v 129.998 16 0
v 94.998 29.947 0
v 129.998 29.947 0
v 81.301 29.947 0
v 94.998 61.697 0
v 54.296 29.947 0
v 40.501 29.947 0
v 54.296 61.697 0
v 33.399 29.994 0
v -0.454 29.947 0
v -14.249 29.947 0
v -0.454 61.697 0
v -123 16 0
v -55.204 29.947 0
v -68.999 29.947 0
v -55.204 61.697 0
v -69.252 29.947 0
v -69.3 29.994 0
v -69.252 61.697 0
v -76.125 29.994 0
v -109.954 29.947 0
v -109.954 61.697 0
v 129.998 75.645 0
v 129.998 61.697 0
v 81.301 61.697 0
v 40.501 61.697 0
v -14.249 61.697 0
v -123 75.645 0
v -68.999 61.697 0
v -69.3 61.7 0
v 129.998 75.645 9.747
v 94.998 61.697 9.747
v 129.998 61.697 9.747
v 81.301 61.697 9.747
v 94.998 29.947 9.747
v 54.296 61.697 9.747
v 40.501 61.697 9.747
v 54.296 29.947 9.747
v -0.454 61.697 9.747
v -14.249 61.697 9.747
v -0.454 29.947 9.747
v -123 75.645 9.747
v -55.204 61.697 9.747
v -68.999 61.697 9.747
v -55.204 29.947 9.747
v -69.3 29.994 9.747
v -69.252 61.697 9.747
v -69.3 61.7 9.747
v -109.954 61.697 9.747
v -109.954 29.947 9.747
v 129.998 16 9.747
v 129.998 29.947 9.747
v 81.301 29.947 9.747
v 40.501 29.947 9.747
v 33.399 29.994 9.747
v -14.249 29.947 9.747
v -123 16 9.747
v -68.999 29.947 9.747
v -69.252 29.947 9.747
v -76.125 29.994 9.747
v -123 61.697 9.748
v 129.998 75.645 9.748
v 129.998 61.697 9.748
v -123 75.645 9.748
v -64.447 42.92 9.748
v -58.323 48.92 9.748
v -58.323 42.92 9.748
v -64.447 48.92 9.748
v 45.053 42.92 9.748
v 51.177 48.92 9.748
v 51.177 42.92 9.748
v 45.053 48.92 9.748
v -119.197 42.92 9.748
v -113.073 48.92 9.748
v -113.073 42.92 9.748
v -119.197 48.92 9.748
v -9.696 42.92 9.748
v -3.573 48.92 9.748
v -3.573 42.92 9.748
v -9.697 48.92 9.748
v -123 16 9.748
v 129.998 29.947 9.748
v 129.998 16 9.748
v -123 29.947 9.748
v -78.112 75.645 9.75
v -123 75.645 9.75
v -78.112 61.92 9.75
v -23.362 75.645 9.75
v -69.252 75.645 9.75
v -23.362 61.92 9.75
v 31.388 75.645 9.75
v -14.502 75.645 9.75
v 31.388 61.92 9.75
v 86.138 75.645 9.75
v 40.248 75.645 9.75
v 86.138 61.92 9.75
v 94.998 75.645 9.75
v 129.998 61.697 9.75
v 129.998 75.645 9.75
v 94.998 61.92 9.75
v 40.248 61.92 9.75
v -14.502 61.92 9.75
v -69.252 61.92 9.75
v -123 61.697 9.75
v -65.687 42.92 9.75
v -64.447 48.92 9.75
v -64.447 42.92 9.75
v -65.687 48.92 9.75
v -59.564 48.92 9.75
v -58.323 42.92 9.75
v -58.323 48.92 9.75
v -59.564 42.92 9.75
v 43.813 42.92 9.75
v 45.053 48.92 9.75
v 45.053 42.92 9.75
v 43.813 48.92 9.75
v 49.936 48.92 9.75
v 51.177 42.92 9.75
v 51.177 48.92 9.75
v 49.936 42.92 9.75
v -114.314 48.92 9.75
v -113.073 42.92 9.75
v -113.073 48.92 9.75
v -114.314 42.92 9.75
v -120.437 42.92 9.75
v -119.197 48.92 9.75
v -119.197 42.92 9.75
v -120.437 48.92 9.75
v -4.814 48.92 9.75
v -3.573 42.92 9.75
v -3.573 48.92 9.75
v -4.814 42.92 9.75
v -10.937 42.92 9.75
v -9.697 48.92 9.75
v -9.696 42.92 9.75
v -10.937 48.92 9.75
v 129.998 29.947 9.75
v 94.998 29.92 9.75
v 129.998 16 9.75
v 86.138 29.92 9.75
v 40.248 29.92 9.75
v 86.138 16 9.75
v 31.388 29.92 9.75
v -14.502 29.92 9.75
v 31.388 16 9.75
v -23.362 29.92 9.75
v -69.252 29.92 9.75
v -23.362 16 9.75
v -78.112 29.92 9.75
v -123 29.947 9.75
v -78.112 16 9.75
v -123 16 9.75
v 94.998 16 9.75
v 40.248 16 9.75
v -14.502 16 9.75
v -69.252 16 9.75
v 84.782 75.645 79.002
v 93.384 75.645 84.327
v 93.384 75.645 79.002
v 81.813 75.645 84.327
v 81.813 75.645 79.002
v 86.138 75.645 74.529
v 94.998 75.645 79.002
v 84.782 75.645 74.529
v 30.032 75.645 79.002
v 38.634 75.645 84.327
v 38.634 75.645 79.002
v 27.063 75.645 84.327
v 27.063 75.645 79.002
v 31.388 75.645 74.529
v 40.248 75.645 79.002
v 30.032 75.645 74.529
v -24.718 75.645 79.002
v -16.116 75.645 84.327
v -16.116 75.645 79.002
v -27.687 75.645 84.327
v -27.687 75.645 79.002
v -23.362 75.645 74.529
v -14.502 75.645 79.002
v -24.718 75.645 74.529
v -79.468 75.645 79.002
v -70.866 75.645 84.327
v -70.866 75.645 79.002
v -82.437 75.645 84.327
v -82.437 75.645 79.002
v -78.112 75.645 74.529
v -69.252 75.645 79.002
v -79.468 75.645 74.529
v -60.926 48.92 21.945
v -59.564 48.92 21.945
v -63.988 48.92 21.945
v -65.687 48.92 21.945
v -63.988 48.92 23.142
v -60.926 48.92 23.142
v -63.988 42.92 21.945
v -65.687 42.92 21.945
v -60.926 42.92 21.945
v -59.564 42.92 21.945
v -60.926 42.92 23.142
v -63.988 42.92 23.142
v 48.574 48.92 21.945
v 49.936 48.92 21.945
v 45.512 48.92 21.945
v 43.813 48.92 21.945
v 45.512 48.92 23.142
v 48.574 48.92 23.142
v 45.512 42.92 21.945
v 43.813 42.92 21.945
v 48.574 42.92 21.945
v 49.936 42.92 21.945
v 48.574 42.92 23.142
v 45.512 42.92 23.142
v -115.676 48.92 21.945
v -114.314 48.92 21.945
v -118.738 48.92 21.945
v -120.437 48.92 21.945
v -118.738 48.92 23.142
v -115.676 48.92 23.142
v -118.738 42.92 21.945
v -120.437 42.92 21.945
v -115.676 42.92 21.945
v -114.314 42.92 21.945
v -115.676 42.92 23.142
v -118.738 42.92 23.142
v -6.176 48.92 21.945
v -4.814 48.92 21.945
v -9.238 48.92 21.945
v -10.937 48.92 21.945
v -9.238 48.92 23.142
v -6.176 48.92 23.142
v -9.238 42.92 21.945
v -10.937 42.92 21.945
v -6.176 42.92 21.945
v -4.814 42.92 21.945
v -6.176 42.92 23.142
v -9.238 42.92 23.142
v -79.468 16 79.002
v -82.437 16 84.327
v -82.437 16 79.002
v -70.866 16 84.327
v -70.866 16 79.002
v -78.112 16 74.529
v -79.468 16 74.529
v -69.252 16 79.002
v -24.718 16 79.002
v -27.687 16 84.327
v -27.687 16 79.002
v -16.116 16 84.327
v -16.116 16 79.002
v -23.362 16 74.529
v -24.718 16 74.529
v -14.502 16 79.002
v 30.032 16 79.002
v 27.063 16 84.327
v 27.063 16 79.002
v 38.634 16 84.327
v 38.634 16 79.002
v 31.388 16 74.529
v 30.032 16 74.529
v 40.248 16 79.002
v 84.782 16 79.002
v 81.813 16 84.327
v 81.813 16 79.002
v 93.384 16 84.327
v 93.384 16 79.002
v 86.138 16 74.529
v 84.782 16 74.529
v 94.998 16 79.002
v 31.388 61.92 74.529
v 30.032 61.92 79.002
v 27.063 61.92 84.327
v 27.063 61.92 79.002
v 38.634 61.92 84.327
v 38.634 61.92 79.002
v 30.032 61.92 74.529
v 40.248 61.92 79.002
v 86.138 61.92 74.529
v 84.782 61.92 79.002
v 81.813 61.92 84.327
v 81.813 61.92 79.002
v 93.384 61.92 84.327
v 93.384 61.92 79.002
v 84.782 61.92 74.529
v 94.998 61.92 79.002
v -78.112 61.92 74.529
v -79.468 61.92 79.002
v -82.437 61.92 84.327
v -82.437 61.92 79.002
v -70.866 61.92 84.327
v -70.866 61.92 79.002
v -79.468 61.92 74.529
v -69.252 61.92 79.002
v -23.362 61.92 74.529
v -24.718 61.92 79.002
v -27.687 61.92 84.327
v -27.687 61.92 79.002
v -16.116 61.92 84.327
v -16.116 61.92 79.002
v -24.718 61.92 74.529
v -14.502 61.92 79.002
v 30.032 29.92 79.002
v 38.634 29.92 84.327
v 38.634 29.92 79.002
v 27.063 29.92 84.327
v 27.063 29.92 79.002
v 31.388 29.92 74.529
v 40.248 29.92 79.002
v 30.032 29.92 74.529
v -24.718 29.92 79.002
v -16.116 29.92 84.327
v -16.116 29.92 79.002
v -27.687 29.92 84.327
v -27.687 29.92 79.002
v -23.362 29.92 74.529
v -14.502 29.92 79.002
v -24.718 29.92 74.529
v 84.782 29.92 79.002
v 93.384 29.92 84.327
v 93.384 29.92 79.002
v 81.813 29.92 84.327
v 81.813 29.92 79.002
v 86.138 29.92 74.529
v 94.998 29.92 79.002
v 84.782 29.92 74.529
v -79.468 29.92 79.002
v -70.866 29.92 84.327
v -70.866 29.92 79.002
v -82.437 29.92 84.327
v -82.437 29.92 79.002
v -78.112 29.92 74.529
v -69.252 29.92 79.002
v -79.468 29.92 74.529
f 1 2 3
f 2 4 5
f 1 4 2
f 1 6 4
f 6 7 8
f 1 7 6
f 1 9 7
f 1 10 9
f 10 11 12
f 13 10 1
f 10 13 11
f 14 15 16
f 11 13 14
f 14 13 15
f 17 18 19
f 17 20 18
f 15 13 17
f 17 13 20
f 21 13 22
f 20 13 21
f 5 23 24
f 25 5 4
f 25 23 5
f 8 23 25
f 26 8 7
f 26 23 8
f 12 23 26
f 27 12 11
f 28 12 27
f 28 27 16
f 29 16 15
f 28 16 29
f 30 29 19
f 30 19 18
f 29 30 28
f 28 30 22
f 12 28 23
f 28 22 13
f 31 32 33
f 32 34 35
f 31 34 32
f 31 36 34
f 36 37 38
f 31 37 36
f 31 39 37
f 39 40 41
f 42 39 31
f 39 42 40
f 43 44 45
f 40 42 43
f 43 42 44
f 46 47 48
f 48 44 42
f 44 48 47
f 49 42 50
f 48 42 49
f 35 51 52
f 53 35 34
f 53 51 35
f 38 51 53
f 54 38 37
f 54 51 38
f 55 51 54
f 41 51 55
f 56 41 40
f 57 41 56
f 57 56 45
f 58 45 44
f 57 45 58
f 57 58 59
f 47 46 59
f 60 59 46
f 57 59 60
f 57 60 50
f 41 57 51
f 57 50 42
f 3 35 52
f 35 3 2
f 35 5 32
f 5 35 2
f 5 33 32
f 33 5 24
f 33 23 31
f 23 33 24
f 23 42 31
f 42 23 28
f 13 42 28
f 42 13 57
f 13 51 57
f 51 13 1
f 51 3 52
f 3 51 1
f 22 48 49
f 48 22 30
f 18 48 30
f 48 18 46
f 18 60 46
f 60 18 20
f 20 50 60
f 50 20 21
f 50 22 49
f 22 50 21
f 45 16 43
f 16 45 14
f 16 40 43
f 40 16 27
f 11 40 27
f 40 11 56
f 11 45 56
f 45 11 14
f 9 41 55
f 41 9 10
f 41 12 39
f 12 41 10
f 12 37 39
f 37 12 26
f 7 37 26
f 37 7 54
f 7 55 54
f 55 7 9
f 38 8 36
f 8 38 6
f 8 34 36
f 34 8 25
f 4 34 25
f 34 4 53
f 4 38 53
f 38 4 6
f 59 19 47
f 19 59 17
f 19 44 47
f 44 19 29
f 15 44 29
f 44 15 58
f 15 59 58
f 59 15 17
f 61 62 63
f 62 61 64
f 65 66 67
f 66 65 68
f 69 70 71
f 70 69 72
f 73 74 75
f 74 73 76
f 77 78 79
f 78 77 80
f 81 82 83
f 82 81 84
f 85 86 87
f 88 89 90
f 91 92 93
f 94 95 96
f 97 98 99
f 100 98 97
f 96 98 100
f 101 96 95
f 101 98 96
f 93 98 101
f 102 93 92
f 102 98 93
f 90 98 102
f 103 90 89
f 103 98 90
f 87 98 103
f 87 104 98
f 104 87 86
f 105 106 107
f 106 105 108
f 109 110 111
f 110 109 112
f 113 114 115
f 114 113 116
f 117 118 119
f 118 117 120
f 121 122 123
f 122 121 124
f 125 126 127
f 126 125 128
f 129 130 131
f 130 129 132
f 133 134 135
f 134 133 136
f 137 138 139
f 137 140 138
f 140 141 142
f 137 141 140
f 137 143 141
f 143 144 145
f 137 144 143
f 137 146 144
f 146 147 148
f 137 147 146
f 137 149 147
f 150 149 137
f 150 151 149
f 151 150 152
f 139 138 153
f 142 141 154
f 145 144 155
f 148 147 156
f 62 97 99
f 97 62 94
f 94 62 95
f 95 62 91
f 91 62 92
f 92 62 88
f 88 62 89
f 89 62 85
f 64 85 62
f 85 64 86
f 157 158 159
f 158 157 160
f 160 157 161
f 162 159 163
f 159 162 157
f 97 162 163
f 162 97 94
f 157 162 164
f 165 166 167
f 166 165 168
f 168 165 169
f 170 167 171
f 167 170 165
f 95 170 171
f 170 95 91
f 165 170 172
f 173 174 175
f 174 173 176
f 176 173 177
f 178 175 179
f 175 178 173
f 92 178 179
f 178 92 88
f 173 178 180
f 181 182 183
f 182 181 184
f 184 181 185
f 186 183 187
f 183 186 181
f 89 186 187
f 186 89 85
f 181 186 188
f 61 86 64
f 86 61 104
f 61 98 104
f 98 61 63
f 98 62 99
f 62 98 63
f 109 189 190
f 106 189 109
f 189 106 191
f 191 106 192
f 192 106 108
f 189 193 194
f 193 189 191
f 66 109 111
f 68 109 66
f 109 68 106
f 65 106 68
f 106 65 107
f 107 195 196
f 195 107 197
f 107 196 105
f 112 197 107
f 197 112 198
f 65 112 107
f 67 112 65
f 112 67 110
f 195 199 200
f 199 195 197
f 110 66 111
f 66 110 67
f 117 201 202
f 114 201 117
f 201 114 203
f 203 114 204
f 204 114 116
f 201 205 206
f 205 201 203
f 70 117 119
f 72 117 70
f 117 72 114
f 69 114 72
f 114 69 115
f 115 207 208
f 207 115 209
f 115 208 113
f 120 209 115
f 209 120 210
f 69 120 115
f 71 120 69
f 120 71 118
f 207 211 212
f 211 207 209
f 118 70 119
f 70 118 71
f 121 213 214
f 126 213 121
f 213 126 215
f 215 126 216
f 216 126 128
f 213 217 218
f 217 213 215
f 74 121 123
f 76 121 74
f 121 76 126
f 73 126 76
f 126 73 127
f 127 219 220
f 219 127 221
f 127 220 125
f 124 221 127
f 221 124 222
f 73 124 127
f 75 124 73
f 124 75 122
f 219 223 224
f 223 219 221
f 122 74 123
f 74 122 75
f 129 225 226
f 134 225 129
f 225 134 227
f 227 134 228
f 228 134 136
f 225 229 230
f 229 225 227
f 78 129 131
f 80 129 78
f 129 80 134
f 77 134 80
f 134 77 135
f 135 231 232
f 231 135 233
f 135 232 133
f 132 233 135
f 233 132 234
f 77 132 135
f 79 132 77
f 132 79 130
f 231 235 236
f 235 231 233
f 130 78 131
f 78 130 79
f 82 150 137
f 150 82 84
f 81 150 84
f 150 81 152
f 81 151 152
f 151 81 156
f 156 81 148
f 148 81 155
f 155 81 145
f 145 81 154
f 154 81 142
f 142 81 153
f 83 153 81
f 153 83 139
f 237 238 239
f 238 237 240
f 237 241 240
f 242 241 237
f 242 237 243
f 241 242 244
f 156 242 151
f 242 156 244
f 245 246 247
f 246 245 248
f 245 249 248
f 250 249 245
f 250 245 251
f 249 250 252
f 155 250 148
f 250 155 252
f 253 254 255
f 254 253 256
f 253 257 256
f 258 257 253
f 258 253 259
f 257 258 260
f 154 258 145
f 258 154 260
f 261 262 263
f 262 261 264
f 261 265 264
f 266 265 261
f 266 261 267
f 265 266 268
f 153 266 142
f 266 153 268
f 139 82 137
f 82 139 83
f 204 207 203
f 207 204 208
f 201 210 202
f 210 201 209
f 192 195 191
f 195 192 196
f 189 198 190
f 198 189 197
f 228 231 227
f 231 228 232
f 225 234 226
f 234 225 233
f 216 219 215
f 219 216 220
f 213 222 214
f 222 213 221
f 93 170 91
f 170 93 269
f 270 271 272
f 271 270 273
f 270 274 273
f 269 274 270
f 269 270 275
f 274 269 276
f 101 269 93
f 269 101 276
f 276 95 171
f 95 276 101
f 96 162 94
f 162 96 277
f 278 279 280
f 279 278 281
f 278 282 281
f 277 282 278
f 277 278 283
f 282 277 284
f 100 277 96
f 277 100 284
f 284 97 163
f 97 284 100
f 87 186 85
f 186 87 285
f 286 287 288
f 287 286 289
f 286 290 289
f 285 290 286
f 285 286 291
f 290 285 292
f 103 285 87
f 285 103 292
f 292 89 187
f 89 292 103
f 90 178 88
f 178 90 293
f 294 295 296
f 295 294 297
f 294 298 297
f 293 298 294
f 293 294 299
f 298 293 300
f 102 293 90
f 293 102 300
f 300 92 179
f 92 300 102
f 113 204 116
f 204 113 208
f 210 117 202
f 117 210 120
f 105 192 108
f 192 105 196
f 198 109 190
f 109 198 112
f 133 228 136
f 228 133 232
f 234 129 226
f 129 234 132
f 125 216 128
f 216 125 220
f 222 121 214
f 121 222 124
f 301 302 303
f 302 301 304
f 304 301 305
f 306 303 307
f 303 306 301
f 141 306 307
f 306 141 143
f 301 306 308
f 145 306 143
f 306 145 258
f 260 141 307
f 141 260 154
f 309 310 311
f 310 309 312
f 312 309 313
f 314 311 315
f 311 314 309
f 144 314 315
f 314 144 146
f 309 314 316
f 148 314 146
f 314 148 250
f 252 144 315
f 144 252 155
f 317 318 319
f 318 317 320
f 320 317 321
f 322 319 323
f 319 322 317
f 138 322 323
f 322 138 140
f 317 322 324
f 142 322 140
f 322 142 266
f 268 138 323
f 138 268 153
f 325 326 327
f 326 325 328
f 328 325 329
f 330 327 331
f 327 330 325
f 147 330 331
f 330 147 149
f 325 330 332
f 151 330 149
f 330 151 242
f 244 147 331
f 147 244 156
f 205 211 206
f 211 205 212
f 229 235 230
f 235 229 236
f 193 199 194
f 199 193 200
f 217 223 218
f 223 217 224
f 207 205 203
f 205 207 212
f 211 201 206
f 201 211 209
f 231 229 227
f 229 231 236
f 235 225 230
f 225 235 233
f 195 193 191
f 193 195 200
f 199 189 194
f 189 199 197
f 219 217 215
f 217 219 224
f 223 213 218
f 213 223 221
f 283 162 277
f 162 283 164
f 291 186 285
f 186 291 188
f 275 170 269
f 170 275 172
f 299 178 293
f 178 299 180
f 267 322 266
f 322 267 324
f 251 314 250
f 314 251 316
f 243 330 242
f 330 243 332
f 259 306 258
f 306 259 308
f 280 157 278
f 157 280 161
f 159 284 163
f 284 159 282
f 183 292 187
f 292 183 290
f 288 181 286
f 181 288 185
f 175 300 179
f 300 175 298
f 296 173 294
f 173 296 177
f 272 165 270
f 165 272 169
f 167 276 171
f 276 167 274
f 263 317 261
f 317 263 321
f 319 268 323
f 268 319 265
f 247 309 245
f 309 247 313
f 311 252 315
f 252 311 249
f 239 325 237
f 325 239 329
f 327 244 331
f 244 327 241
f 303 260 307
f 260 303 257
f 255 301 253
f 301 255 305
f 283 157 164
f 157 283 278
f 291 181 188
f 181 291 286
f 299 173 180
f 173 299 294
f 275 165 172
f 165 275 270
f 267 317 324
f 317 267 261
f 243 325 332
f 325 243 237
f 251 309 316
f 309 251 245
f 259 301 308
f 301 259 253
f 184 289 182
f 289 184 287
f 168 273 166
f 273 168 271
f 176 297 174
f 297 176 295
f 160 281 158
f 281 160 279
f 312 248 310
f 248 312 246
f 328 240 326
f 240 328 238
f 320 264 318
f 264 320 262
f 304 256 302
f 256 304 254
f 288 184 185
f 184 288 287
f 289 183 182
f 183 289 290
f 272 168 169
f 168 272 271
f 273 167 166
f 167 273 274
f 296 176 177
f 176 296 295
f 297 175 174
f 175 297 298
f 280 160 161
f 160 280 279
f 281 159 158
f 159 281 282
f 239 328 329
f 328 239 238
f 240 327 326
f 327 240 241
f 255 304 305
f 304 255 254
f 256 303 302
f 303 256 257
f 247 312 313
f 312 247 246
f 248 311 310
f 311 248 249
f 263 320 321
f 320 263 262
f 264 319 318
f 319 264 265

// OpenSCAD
// Auto reverse-engineered from STL into layered parametric OpenSCAD
// This rebuild uses cross-section polygons between Z levels and extrudes each slab.

z_levels = [-0.000000, 0.001000, 9.748000, 9.750000, 21.945000, 23.142000, 74.529000, 79.001600, 84.327000, 87.549000];

module top_parametric(z=z_levels) {
  union() {
    
    // slab 1: z=0.001000..9.748000
    translate([0,0,0.000000]) linear_extrude(height=9.747000) union() {
      // slab 1 poly 0
      polygon(points=[
          [-123.000008, 68.670280],
          [-123.000008, 15.999999],
          [129.997986, 15.999999],
          [129.997986, 29.946999],
          [94.997986, 29.946999],
          [94.997986, 61.696999],
          [129.997986, 61.696999],
          [129.997986, 75.644997],
          [-123.000008, 75.644997],
          [-34.505024, 61.696999],
          [-55.204014, 61.696999],
          [-55.204014, 29.946999],
          [-14.249004, 29.946999],
          [-14.249004, 61.696999],
          [33.399488, 29.993999],
          [40.500984, 29.946999],
          [40.500984, 61.696999],
          [-0.454014, 61.696999],
          [-0.454014, 29.946999],
          [-76.124513, 29.993999],
          [-69.300011, 29.993999],
          [-69.300011, 61.699997],
          [-109.954018, 61.696999],
          [-109.954018, 29.946999],
          [63.978926, 61.696999],
          [54.295986, 61.696999],
          [54.295986, 29.946999],
          [81.300987, 29.946999],
          [81.300987, 61.696999],
          [-68.999001, 61.696999],
          [-69.252014, 61.696999],
          [-69.252014, 29.946999],
          [-68.999001, 29.946999]
      ], paths=[
          [0, 1, 2, 3, 4, 5, 6, 7, 8],
          [9, 10, 11, 12, 13],
          [14, 15, 16, 17, 18],
          [19, 20, 21, 22, 23],
          [24, 25, 26, 27, 28],
          [29, 30, 31, 32]
      ]);
    }
    // slab 2: z=9.748000..9.750000
    translate([0,0,9.748000]) linear_extrude(height=0.002000) union() {
      // slab 2 poly 0
      polygon(points=[
          [-34.505024, 61.696999],
          [129.997986, 61.696999],
          [129.997986, 75.644997],
          [-123.000008, 75.644997],
          [-123.000008, 61.696999]
      ], paths=[
          [0, 1, 2, 3, 4]
      ]);
      // slab 2 poly 1
      polygon(points=[
          [-63.651517, 29.946999],
          [-123.000008, 29.946999],
          [-123.000008, 15.999999],
          [129.997986, 15.999999],
          [129.997986, 29.946999]
      ], paths=[
          [0, 1, 2, 3, 4]
      ]);
      // slab 2 poly 2
      polygon(points=[
          [-64.446630, 42.919998],
          [-58.323427, 42.919998],
          [-58.323427, 48.919998],
          [-64.446630, 48.919998]
      ], paths=[
          [0, 1, 2, 3]
      ]);
      // slab 2 poly 3
      polygon(points=[
          [45.053381, 42.919998],
          [51.176573, 42.919998],
          [51.176573, 48.919998],
          [45.053381, 48.919998]
      ], paths=[
          [0, 1, 2, 3]
      ]);
      // slab 2 poly 4
      polygon(points=[
          [-113.073431, 42.919998],
          [-113.073431, 48.919998],
          [-119.196615, 48.919998],
          [-119.196615, 42.919998]
      ], paths=[
          [0, 1, 2, 3]
      ]);
      // slab 2 poly 5
      polygon(points=[
          [-9.696170, 42.919998],
          [-3.573428, 42.919998],
          [-3.573428, 48.919998],
          [-9.696628, 48.919998]
      ], paths=[
          [0, 1, 2, 3]
      ]);
    }
    // slab 3: z=9.750000..21.945000
    translate([0,0,9.750000]) linear_extrude(height=12.195000) union() {
      // slab 3 poly 0
      polygon(points=[
          [39.414014, 29.919998],
          [31.387985, 29.919998],
          [31.387985, 15.999999],
          [40.247986, 15.999999],
          [40.247986, 29.919998]
      ], paths=[
          [0, 1, 2, 3, 4]
      ]);
      // slab 3 poly 1
      polygon(points=[
          [-15.335986, 29.919998],
          [-23.362015, 29.919998],
          [-23.362015, 15.999999],
          [-14.502014, 15.999999],
          [-14.502014, 29.919998]
      ], paths=[
          [0, 1, 2, 3, 4]
      ]);
      // slab 3 poly 2
      polygon(points=[
          [94.997986, 29.919998],
          [86.137985, 29.919998],
          [86.137985, 15.999999],
          [94.997986, 15.999999]
      ], paths=[
          [0, 1, 2, 3]
      ]);
      // slab 3 poly 3
      polygon(points=[
          [-78.112015, 29.919998],
          [-78.112015, 15.999999],
          [-69.252014, 15.999999],
          [-69.252014, 29.919998]
      ], paths=[
          [0, 1, 2, 3]
      ]);
      // slab 3 poly 4
      polygon(points=[
          [39.414014, 61.919998],
          [40.247986, 61.919998],
          [40.247986, 75.644997],
          [31.387985, 75.644997],
          [31.387985, 61.919998]
      ], paths=[
          [0, 1, 2, 3, 4]
      ]);
      // slab 3 poly 5
      polygon(points=[
          [94.997986, 61.919998],
          [94.997986, 75.644997],
          [86.137985, 75.644997],
          [86.137985, 61.919998]
      ], paths=[
          [0, 1, 2, 3]
      ]);
      // slab 3 poly 6
      polygon(points=[
          [-78.112015, 74.353093],
          [-78.112015, 61.919998],
          [-69.252014, 61.919998],
          [-69.252014, 75.644997],
          [-78.112015, 75.644997]
      ], paths=[
          [0, 1, 2, 3, 4]
      ]);
      // slab 3 poly 7
      polygon(points=[
          [-15.335986, 61.919998],
          [-14.502014, 61.919998],
          [-14.502014, 75.644997],
          [-23.362015, 75.644997],
          [-23.362015, 61.919998]
      ], paths=[
          [0, 1, 2, 3, 4]
      ]);
      // slab 3 poly 8
      polygon(points=[
          [49.935932, 45.652342],
          [49.935932, 48.919998],
          [43.812582, 48.919998],
          [43.812582, 42.919998],
          [49.935932, 42.919998]
      ], paths=[
          [0, 1, 2, 3, 4]
      ]);
      // slab 3 poly 9
      polygon(points=[
          [-62.898826, 42.919998],
          [-59.564071, 42.919998],
          [-59.564071, 48.919998],
          [-65.687418, 48.919998],
          [-65.687418, 42.919998]
      ], paths=[
          [0, 1, 2, 3, 4]
      ]);
      // slab 3 poly 10
      polygon(points=[
          [-10.937418, 42.919998],
          [-4.814072, 42.919998],
          [-4.814072, 48.919998],
          [-10.937418, 48.919998]
      ], paths=[
          [0, 1, 2, 3]
      ]);
      // slab 3 poly 11
      polygon(points=[
          [-117.648819, 42.919998],
          [-114.314075, 42.919998],
          [-114.314075, 48.919998],
          [-120.437410, 48.919998],
          [-120.437410, 42.919998]
      ], paths=[
          [0, 1, 2, 3, 4]
      ]);
    }
    // slab 4: z=21.945000..23.142000
    translate([0,0,21.945000]) linear_extrude(height=1.197000) union() {
      // slab 4 poly 0
      polygon(points=[
          [-16.251816, 29.919998],
          [-23.362015, 29.919998],
          [-23.362015, 15.999999],
          [-14.502014, 15.999999],
          [-14.502014, 29.919998]
      ], paths=[
          [0, 1, 2, 3, 4]
      ]);
      // slab 4 poly 1
      polygon(points=[
          [38.498184, 29.919998],
          [31.387985, 29.919998],
          [31.387985, 15.999999],
          [40.247986, 15.999999],
          [40.247986, 29.919998]
      ], paths=[
          [0, 1, 2, 3, 4]
      ]);
      // slab 4 poly 2
      polygon(points=[
          [94.997986, 29.919998],
          [86.137985, 29.919998],
          [86.137985, 15.999999],
          [94.997986, 15.999999]
      ], paths=[
          [0, 1, 2, 3]
      ]);
      // slab 4 poly 3
      polygon(points=[
          [-78.112015, 29.919998],
          [-78.112015, 15.999999],
          [-69.252014, 15.999999],
          [-69.252014, 29.919998]
      ], paths=[
          [0, 1, 2, 3]
      ]);
      // slab 4 poly 4
      polygon(points=[
          [38.498184, 61.919998],
          [40.247986, 61.919998],
          [40.247986, 75.644997],
          [31.387985, 75.644997],
          [31.387985, 61.919998]
      ], paths=[
          [0, 1, 2, 3, 4]
      ]);
      // slab 4 poly 5
      polygon(points=[
          [94.997986, 64.455545],
          [94.997986, 75.644997],
          [86.137985, 75.644997],
          [86.137985, 61.919998],
          [94.997986, 61.919998]
      ], paths=[
          [0, 1, 2, 3, 4]
      ]);
      // slab 4 poly 6
      polygon(points=[
          [-78.112015, 61.919998],
          [-69.252014, 61.919998],
          [-69.252014, 75.644997],
          [-78.112015, 75.644997]
      ], paths=[
          [0, 1, 2, 3]
      ]);
      // slab 4 poly 7
      polygon(points=[
          [-16.251816, 61.919998],
          [-14.502014, 61.919998],
          [-14.502014, 75.644997],
          [-23.362015, 75.644997],
          [-23.362015, 61.919998]
      ], paths=[
          [0, 1, 2, 3, 4]
      ]);
      // slab 4 poly 8
      polygon(points=[
          [45.511995, 45.920008],
          [45.511995, 42.919998],
          [48.573739, 42.919998],
          [48.573739, 48.919998],
          [45.511995, 48.919998]
      ], paths=[
          [0, 1, 2, 3, 4]
      ]);
      // slab 4 poly 9
      polygon(points=[
          [-6.449878, 42.919998],
          [-6.176269, 42.919998],
          [-6.176269, 48.919998],
          [-9.238005, 48.919998],
          [-9.238005, 42.919998]
      ], paths=[
          [0, 1, 2, 3, 4]
      ]);
      // slab 4 poly 10
      polygon(points=[
          [-63.988003, 45.920008],
          [-63.988003, 42.919998],
          [-60.926268, 42.919998],
          [-60.926268, 48.919998],
          [-63.988003, 48.919998]
      ], paths=[
          [0, 1, 2, 3, 4]
      ]);
      // slab 4 poly 11
      polygon(points=[
          [-115.676272, 48.651894],
          [-115.676272, 48.919998],
          [-118.738005, 48.919998],
          [-118.738005, 42.919998],
          [-115.676272, 42.919998]
      ], paths=[
          [0, 1, 2, 3, 4]
      ]);
    }
    // slab 5: z=23.142000..74.529000
    translate([0,0,23.142000]) linear_extrude(height=51.387000) union() {
      // slab 5 poly 0
      polygon(points=[
          [89.652155, 29.919998],
          [86.137985, 29.919998],
          [86.137985, 15.999999],
          [94.997986, 15.999999],
          [94.997986, 29.919998]
      ], paths=[
          [0, 1, 2, 3, 4]
      ]);
      // slab 5 poly 1
      polygon(points=[
          [-78.112015, 21.521132],
          [-78.112015, 15.999999],
          [-69.252014, 15.999999],
          [-69.252014, 29.919998],
          [-78.112015, 29.919998]
      ], paths=[
          [0, 1, 2, 3, 4]
      ]);
      // slab 5 poly 2
      polygon(points=[
          [34.902155, 29.919998],
          [31.387985, 29.919998],
          [31.387985, 15.999999],
          [40.247986, 15.999999],
          [40.247986, 29.919998]
      ], paths=[
          [0, 1, 2, 3, 4]
      ]);
      // slab 5 poly 3
      polygon(points=[
          [-19.847845, 29.919998],
          [-23.362015, 29.919998],
          [-23.362015, 15.999999],
          [-14.502014, 15.999999],
          [-14.502014, 29.919998]
      ], paths=[
          [0, 1, 2, 3, 4]
      ]);
      // slab 5 poly 4
      polygon(points=[
          [89.652155, 61.919998],
          [94.997986, 61.919998],
          [94.997986, 75.644997],
          [86.137985, 75.644997],
          [86.137985, 61.919998]
      ], paths=[
          [0, 1, 2, 3, 4]
      ]);
      // slab 5 poly 5
      polygon(points=[
          [-78.112015, 61.919998],
          [-69.252014, 61.919998],
          [-69.252014, 75.644997],
          [-78.112015, 75.644997]
      ], paths=[
          [0, 1, 2, 3]
      ]);
      // slab 5 poly 6
      polygon(points=[
          [34.902155, 61.919998],
          [40.247986, 61.919998],
          [40.247986, 75.644997],
          [31.387985, 75.644997],
          [31.387985, 61.919998]
      ], paths=[
          [0, 1, 2, 3, 4]
      ]);
      // slab 5 poly 7
      polygon(points=[
          [-19.847845, 61.919998],
          [-14.502014, 61.919998],
          [-14.502014, 75.644997],
          [-23.362015, 75.644997],
          [-23.362015, 61.919998]
      ], paths=[
          [0, 1, 2, 3, 4]
      ]);
    }
    // slab 6: z=74.529000..79.001600
    translate([0,0,74.529000]) linear_extrude(height=4.472600) union() {
      // slab 6 poly 0
      polygon(points=[
          [90.567939, 29.919998],
          [84.782464, 29.919998],
          [84.782464, 15.999999],
          [94.997986, 15.999999],
          [94.997986, 29.919998]
      ], paths=[
          [0, 1, 2, 3, 4]
      ]);
      // slab 6 poly 1
      polygon(points=[
          [-79.467536, 29.919998],
          [-79.467536, 15.999999],
          [-69.252014, 15.999999],
          [-69.252014, 29.919998]
      ], paths=[
          [0, 1, 2, 3]
      ]);
      // slab 6 poly 2
      polygon(points=[
          [-18.932061, 29.919998],
          [-24.717536, 29.919998],
          [-24.717536, 15.999999],
          [-14.502014, 15.999999],
          [-14.502014, 29.919998]
      ], paths=[
          [0, 1, 2, 3, 4]
      ]);
      // slab 6 poly 3
      polygon(points=[
          [35.817939, 29.919998],
          [30.032464, 29.919998],
          [30.032464, 15.999999],
          [40.247986, 15.999999],
          [40.247986, 29.919998]
      ], paths=[
          [0, 1, 2, 3, 4]
      ]);
      // slab 6 poly 4
      polygon(points=[
          [90.567939, 61.919998],
          [94.997986, 61.919998],
          [94.997986, 75.644997],
          [84.782464, 75.644997],
          [84.782464, 61.919998]
      ], paths=[
          [0, 1, 2, 3, 4]
      ]);
      // slab 6 poly 5
      polygon(points=[
          [-79.467536, 61.919998],
          [-69.252014, 61.919998],
          [-69.252014, 75.644997],
          [-79.467536, 75.644997]
      ], paths=[
          [0, 1, 2, 3]
      ]);
      // slab 6 poly 6
      polygon(points=[
          [-18.932061, 61.919998],
          [-14.502014, 61.919998],
          [-14.502014, 75.644997],
          [-24.717536, 75.644997],
          [-24.717536, 61.919998]
      ], paths=[
          [0, 1, 2, 3, 4]
      ]);
      // slab 6 poly 7
      polygon(points=[
          [35.817939, 61.919998],
          [40.247986, 61.919998],
          [40.247986, 75.644997],
          [30.032464, 75.644997],
          [30.032464, 61.919998]
      ], paths=[
          [0, 1, 2, 3, 4]
      ]);
    }
    // slab 7: z=79.001600..84.327000
    translate([0,0,79.001600]) linear_extrude(height=5.325400) union() {
      // slab 7 poly 0
      polygon(points=[
          [-76.095416, 15.999999],
          [-70.865755, 15.999999],
          [-70.865755, 29.919998],
          [-82.437039, 29.919998],
          [-82.437039, 15.999999]
      ], paths=[
          [0, 1, 2, 3, 4]
      ]);
      // slab 7 poly 1
      polygon(points=[
          [38.634246, 20.336328],
          [38.634246, 29.919998],
          [27.062964, 29.919998],
          [27.062964, 15.999999],
          [38.634246, 15.999999]
      ], paths=[
          [0, 1, 2, 3, 4]
      ]);
      // slab 7 poly 2
      polygon(points=[
          [-18.503779, 29.919998],
          [-27.687036, 29.919998],
          [-27.687036, 15.999999],
          [-16.115755, 15.999999],
          [-16.115755, 29.919998]
      ], paths=[
          [0, 1, 2, 3, 4]
      ]);
      // slab 7 poly 3
      polygon(points=[
          [90.996219, 29.919998],
          [81.812961, 29.919998],
          [81.812961, 15.999999],
          [93.384242, 15.999999],
          [93.384242, 29.919998]
      ], paths=[
          [0, 1, 2, 3, 4]
      ]);
      // slab 7 poly 4
      polygon(points=[
          [-76.095416, 75.644997],
          [-82.437039, 75.644997],
          [-82.437039, 61.919998],
          [-70.865755, 61.919998],
          [-70.865755, 75.644997]
      ], paths=[
          [0, 1, 2, 3, 4]
      ]);
      // slab 7 poly 5
      polygon(points=[
          [38.634246, 71.369414],
          [38.634246, 75.644997],
          [27.062964, 75.644997],
          [27.062964, 61.919998],
          [38.634246, 61.919998]
      ], paths=[
          [0, 1, 2, 3, 4]
      ]);
      // slab 7 poly 6
      polygon(points=[
          [-18.503779, 75.644997],
          [-27.687036, 75.644997],
          [-27.687036, 61.919998],
          [-16.115755, 61.919998],
          [-16.115755, 75.644997]
      ], paths=[
          [0, 1, 2, 3, 4]
      ]);
      // slab 7 poly 7
      polygon(points=[
          [83.953540, 61.919998],
          [93.384242, 61.919998],
          [93.384242, 75.644997],
          [81.812961, 75.644997],
          [81.812961, 61.919998]
      ], paths=[
          [0, 1, 2, 3, 4]
      ]);
    }
  }
}

// Render
top_parametric();
